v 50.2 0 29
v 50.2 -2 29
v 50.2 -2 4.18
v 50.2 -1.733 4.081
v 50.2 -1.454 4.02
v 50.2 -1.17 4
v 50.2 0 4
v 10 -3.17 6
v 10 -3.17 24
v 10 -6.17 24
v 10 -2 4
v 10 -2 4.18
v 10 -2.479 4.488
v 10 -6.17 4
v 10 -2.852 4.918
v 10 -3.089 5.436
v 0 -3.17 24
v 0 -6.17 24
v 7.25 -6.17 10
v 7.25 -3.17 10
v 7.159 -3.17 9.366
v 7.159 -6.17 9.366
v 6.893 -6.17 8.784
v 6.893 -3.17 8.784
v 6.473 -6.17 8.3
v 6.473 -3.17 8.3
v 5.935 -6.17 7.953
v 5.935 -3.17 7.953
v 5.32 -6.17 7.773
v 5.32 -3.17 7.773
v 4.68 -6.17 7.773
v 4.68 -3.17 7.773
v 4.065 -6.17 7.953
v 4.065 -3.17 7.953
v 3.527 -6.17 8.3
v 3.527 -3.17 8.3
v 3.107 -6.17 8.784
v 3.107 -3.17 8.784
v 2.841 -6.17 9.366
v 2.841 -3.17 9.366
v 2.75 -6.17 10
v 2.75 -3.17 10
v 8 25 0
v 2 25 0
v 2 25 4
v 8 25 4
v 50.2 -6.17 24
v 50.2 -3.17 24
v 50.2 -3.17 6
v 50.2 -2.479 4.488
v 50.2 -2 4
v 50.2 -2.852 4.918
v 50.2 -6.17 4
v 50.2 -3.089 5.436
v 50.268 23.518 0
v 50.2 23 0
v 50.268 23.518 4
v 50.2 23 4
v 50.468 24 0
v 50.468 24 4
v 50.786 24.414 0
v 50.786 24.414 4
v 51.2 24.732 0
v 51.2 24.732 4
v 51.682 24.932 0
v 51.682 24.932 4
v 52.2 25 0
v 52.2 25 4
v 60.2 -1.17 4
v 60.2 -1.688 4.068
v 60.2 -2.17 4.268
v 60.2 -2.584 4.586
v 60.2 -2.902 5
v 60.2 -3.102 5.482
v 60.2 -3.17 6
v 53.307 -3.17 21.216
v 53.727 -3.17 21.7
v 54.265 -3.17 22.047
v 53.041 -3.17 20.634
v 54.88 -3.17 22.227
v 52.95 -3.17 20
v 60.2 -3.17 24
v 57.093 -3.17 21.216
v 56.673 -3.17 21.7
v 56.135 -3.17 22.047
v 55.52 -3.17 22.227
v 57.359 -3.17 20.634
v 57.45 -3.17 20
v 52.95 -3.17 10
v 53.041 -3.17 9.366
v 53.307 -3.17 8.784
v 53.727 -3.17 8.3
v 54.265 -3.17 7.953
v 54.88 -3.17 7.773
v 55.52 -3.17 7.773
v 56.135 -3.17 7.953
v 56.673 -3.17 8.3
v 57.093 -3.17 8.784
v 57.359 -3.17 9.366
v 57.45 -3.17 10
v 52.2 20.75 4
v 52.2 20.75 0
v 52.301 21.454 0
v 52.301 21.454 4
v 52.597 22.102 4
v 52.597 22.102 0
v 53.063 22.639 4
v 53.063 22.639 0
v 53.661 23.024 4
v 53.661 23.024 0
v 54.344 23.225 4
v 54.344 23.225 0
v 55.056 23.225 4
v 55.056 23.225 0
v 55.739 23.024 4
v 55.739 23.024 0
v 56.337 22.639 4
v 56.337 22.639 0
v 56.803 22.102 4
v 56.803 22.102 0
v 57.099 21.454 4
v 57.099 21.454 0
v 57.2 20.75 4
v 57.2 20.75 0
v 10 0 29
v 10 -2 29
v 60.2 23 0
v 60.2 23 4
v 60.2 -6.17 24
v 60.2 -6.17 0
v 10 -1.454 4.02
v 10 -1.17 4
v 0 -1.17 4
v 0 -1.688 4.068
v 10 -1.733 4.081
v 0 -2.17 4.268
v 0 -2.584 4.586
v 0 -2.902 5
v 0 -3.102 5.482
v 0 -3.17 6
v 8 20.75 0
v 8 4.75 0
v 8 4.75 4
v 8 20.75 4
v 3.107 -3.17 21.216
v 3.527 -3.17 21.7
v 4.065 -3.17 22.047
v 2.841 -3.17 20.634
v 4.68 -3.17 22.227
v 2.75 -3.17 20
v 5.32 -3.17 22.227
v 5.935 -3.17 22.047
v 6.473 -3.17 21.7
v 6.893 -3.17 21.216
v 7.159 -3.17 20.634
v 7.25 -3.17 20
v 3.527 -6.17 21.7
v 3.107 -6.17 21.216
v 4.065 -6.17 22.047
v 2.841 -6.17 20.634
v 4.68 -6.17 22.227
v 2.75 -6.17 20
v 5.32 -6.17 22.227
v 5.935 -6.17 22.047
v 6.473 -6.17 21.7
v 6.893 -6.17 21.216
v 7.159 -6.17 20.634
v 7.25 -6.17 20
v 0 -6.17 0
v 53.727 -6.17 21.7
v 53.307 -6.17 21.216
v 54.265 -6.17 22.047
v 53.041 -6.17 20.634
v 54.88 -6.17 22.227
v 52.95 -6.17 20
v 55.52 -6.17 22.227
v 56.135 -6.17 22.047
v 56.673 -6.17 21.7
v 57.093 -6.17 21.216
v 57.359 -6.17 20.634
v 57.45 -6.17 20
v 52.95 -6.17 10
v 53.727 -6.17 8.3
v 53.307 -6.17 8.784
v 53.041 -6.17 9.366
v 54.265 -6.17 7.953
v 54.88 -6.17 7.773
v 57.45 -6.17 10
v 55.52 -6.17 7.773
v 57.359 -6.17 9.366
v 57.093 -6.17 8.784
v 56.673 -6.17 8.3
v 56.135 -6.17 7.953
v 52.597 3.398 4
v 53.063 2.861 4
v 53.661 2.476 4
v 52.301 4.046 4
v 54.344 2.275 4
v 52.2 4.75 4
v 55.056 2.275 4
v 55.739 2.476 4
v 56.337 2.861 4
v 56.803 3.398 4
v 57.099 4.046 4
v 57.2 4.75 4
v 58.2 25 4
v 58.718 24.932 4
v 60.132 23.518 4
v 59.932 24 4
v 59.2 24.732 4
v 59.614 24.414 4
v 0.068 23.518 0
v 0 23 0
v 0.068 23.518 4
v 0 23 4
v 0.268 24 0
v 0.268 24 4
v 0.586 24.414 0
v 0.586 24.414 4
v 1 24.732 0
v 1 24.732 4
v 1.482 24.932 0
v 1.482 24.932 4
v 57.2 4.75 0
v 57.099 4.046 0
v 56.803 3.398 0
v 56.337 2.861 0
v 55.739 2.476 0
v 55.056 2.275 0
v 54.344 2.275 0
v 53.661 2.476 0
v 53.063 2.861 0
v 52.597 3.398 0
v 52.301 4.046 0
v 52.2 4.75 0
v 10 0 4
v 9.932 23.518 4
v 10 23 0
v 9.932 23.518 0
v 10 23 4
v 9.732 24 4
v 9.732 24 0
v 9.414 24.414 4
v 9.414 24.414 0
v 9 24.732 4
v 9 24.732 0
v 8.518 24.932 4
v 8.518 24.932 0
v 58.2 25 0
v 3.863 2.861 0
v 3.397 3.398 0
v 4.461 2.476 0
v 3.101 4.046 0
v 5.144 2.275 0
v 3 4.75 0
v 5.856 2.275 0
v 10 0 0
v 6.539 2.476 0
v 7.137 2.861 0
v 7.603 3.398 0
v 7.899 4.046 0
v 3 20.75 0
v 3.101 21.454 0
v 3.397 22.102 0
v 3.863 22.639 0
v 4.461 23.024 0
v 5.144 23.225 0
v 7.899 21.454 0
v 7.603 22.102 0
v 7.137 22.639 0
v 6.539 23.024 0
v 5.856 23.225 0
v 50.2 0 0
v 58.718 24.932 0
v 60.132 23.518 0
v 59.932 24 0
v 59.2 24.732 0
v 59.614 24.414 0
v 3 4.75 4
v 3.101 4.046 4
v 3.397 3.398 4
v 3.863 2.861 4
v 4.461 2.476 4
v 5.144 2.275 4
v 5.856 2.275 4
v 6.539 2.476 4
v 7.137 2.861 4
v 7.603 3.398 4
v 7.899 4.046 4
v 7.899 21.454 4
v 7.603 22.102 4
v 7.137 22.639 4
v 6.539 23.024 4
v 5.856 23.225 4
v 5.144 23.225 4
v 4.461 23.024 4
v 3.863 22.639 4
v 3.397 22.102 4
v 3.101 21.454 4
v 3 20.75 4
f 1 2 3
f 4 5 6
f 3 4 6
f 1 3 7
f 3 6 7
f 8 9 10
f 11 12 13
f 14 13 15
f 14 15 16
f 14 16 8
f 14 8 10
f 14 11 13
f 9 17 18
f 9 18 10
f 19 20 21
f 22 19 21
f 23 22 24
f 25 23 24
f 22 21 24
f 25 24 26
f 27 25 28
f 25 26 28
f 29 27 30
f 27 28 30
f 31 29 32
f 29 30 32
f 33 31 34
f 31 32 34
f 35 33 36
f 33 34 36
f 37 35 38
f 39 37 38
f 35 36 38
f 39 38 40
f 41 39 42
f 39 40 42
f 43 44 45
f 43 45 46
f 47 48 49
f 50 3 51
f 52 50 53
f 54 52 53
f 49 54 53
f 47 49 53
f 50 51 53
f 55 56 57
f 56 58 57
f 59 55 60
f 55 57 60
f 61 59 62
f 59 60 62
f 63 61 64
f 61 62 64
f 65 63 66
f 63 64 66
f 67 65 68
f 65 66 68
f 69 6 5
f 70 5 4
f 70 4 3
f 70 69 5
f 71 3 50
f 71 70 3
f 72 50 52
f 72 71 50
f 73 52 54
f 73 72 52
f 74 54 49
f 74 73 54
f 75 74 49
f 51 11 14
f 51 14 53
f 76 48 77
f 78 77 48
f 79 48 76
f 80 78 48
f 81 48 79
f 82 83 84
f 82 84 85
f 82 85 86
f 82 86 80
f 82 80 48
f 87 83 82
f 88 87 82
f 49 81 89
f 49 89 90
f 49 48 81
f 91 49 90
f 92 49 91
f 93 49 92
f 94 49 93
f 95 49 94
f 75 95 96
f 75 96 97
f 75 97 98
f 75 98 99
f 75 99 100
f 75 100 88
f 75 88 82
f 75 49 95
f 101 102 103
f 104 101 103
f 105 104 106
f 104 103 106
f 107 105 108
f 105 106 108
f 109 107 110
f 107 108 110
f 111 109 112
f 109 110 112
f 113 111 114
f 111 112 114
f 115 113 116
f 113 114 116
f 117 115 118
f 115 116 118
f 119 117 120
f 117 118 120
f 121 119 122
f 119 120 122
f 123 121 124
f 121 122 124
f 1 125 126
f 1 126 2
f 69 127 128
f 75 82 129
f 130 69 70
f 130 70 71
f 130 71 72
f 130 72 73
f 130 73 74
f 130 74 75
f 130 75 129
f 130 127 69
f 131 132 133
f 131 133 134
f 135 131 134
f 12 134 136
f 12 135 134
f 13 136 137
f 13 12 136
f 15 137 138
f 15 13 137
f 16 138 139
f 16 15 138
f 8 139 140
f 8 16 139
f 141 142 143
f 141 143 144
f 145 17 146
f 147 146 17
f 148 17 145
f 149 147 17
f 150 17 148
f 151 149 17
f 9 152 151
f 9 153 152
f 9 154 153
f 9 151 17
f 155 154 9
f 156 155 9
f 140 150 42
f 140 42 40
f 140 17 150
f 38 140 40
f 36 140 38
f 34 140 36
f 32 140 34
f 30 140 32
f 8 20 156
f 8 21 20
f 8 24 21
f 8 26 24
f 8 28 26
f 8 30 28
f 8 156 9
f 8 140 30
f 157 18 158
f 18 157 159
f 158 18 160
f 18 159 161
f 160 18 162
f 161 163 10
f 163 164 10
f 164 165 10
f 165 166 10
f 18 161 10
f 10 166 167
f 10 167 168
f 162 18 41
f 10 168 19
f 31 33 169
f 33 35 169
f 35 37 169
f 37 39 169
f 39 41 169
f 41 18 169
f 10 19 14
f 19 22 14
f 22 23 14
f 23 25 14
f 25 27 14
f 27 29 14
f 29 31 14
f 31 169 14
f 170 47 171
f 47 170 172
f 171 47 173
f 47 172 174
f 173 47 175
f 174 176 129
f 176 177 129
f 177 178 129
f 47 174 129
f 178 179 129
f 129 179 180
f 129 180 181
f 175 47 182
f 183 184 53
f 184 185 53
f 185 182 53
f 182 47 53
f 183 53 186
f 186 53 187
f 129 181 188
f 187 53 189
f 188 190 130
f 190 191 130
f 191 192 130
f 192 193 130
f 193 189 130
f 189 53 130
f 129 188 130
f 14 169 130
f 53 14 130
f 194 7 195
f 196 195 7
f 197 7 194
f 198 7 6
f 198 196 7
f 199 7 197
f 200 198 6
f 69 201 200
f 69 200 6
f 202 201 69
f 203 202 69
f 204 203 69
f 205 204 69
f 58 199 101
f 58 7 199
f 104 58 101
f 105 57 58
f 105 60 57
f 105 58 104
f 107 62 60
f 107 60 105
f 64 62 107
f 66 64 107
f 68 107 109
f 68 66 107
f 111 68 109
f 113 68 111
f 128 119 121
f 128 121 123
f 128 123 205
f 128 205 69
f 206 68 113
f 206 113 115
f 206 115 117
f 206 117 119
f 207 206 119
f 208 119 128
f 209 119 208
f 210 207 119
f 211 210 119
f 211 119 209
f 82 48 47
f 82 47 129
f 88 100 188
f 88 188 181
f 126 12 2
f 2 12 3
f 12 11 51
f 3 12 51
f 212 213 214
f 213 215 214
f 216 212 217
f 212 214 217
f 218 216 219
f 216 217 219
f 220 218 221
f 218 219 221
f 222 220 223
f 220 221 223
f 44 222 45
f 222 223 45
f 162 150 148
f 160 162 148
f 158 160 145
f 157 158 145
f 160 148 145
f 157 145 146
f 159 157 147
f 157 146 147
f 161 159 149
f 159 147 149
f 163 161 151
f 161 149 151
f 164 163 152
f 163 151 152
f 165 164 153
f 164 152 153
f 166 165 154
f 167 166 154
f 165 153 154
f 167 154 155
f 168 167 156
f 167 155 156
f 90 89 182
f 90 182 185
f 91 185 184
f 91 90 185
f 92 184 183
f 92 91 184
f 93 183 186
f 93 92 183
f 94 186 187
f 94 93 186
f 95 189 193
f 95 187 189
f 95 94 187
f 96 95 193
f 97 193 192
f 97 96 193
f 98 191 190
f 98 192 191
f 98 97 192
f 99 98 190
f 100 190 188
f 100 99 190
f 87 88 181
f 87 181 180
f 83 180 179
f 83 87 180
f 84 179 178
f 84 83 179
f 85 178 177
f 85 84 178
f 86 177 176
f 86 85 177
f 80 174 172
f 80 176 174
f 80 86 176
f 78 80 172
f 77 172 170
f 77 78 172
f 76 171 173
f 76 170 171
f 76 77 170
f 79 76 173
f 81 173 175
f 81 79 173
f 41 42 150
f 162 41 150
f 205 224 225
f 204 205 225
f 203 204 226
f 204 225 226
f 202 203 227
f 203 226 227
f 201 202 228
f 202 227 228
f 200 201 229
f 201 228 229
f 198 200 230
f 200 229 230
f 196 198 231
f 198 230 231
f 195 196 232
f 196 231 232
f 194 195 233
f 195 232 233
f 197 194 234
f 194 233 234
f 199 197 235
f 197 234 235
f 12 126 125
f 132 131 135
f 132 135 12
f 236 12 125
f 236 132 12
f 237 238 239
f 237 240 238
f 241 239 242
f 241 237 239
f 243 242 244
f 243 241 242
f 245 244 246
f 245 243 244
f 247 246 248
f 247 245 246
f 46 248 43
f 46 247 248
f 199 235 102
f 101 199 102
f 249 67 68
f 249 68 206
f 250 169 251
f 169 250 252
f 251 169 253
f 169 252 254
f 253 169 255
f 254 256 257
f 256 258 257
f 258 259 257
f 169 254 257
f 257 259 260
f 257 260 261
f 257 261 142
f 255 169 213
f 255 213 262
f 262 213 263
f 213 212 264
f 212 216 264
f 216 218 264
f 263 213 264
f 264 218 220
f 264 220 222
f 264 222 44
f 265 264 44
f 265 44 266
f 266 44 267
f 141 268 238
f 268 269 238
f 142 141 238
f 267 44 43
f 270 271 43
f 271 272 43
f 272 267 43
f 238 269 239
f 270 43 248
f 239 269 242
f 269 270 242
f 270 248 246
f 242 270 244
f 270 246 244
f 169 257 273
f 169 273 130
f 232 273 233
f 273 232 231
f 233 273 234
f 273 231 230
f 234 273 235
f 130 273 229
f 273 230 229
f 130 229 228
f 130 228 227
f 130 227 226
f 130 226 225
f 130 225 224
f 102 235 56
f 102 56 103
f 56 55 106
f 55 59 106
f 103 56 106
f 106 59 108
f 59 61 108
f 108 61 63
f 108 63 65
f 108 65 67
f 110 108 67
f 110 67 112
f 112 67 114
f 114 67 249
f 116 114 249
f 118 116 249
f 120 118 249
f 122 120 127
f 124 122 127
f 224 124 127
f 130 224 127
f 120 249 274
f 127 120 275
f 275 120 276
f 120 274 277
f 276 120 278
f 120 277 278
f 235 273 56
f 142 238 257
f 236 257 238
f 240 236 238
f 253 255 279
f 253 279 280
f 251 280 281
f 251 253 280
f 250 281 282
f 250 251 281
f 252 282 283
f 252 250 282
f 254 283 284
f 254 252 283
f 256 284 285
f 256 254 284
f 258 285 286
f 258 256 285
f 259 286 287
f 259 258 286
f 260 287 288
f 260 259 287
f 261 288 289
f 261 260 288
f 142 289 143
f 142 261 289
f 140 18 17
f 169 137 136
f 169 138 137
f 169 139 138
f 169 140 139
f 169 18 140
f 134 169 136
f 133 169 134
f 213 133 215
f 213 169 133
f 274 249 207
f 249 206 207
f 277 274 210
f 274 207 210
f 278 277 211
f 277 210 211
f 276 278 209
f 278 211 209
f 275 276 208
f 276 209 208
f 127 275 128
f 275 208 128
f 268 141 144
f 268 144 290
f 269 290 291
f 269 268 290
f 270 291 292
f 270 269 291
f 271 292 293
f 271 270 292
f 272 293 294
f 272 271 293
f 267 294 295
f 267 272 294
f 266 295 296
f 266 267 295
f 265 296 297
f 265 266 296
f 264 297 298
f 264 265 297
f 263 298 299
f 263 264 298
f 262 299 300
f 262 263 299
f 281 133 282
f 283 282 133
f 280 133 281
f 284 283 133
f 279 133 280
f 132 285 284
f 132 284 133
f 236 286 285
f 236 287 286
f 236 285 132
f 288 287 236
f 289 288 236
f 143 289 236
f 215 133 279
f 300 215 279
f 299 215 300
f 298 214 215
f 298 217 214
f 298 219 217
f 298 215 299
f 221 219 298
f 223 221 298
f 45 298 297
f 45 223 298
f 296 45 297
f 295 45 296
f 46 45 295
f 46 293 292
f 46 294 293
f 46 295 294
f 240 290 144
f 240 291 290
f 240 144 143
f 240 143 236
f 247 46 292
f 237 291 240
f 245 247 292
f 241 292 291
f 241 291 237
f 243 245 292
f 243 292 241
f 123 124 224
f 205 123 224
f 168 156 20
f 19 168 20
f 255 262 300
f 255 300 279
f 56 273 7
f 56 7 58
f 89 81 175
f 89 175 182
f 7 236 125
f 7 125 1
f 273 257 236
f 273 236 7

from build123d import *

# Parameters (mm, degrees)
SKETCH1_W             = 10
SKETCH1_H             = 25
BOSS_EXTRUDE1_DEPTH   = 4
BOSS_EXTRUDE1_2_DEPTH = 4
SKETCH1_3_W           = 40.2
SKETCH1_3_H           = 2
BOSS_EXTRUDE2_DEPTH   = 29
SKETCH1_4_W           = 10
SKETCH1_4_H           = 2
BOSS_EXTRUDE3_DEPTH   = 4
FILLET2_R             = 2
SKETCH2_W             = 60.2
SKETCH2_H             = 4
BOSS_EXTRUDE5_DEPTH   = 4.17
SKETCH3_W             = 10
SKETCH3_H             = 3
BOSS_EXTRUDE6_DEPTH   = 20
FILLET3_R             = 2
CUT_EXTRUDE1_DEPTH    = 15


with BuildPart() as part:
    # Sketch1 → Boss-Extrude1 (new body)
    with BuildSketch(Plane.XY):
        with Locations((5, 12.5)):
            Rectangle(SKETCH1_W, SKETCH1_H)
        with BuildLine():
            ThreePointArc((3, 4.75), (5.5, 2.25), (8, 4.75))
            Line((8, 4.75), (8, 20.75))
            ThreePointArc((8, 20.75), (5.5, 23.25), (3, 20.75))
            Line((3, 20.75), (3, 4.75))
        make_face(mode=Mode.SUBTRACT)
    extrude(amount=BOSS_EXTRUDE1_DEPTH)



with BuildPart() as body_2:
    # Sketch1 → Boss-Extrude1 2 (new body)
    with BuildSketch(Plane.XY):
        with Locations((55.2, 12.5)):
            Rectangle(SKETCH1_W, SKETCH1_H)
        with BuildLine():
            Line((57.2, 20.75), (57.2, 4.75))
            ThreePointArc((57.2, 4.75), (54.7, 2.25), (52.2, 4.75))
            Line((52.2, 4.75), (52.2, 20.75))
            ThreePointArc((52.2, 20.75), (54.7, 23.25), (57.2, 20.75))
        make_face(mode=Mode.SUBTRACT)
    extrude(amount=BOSS_EXTRUDE1_2_DEPTH)


with BuildPart() as body_3:
    # Sketch1<3> → Boss-Extrude2 (new body)
    with BuildSketch(Plane.XY):
        with Locations((30.1, -1)):
            Rectangle(SKETCH1_3_W, SKETCH1_3_H)
    extrude(amount=BOSS_EXTRUDE2_DEPTH)


with BuildPart() as part_1:
    add(part.part)

    add(body_2.part)  # Boss-Extrude3 merges body 2

    add(body_3.part)  # Boss-Extrude3 merges body 3
    # Sketch1<4> → Boss-Extrude3 (add)
    with BuildSketch(Plane.XY):
        with Locations((5, -1)):
            Rectangle(SKETCH1_4_W, SKETCH1_4_H)
        with Locations((55.2, -1)):
            Rectangle(SKETCH1_4_W, SKETCH1_4_H)
    extrude(amount=BOSS_EXTRUDE3_DEPTH)

    # Fillet2
    fillet2_edges = [part_1.edges().sort_by_distance(p)[0] for p in [
        (0, 25, 2),
        (10, 25, 2),
        (60.2, 25, 2),
        (50.2, 25, 2),
    ]]
    fillet(fillet2_edges, radius=FILLET2_R)

    # Sketch2 → Boss-Extrude5 (add)
    with BuildSketch(Plane.XZ.offset(2)):
        with Locations((30.1, 2)):
            Rectangle(SKETCH2_W, SKETCH2_H)
    extrude(amount=BOSS_EXTRUDE5_DEPTH)

    # Sketch3 → Boss-Extrude6 (add)
    with BuildSketch(Plane.XY.offset(4)):
        with Locations((5, -4.67)):
            Rectangle(SKETCH3_W, SKETCH3_H)
        with Locations((55.2, -4.67)):
            Rectangle(SKETCH3_W, SKETCH3_H)
    extrude(amount=BOSS_EXTRUDE6_DEPTH)

    # Fillet3
    # the kernel refuses this fillet: 2 mm, written as the material it adds along each edge
    with BuildSketch(Plane(origin=(60.2, -3.17, 4), x_dir=(0, 1, 0), z_dir=(-1, 0, 0)), Plane(origin=(10, -3.17, 4), x_dir=(0, 1, 0), z_dir=(-1, 0, 0))) as fillet3_piece_1:
        with BuildLine():
            CenterArc((FILLET3_R, -FILLET3_R), FILLET3_R, 90, 90)
            Line((0, -FILLET3_R), (0, 0))
            Line((0, 0), (FILLET3_R, 0))
        make_face()
    extrude(amount=10)

    # Sketch4 → Cut-Extrude1 (cut)
    with BuildSketch(Plane(origin=(0, -3.17, 0), x_dir=(1, 0, 0), z_dir=(0, 1, 0))):
        with BuildLine():
            Line((7.25, -20), (7.25, -10))
            ThreePointArc((7.25, -10), (5, -7.75), (2.75, -10))
            Line((2.75, -10), (2.75, -20))
            ThreePointArc((2.75, -20), (5, -22.25), (7.25, -20))
        make_face()
        with BuildLine():
            ThreePointArc((52.95, -10), (55.2, -7.75), (57.45, -10))
            Line((57.45, -10), (57.45, -20))
            ThreePointArc((57.45, -20), (55.2, -22.25), (52.95, -20))
            Line((52.95, -20), (52.95, -10))
        make_face()
    extrude(amount=-CUT_EXTRUDE1_DEPTH, mode=Mode.SUBTRACT)


solid = part_1.part
